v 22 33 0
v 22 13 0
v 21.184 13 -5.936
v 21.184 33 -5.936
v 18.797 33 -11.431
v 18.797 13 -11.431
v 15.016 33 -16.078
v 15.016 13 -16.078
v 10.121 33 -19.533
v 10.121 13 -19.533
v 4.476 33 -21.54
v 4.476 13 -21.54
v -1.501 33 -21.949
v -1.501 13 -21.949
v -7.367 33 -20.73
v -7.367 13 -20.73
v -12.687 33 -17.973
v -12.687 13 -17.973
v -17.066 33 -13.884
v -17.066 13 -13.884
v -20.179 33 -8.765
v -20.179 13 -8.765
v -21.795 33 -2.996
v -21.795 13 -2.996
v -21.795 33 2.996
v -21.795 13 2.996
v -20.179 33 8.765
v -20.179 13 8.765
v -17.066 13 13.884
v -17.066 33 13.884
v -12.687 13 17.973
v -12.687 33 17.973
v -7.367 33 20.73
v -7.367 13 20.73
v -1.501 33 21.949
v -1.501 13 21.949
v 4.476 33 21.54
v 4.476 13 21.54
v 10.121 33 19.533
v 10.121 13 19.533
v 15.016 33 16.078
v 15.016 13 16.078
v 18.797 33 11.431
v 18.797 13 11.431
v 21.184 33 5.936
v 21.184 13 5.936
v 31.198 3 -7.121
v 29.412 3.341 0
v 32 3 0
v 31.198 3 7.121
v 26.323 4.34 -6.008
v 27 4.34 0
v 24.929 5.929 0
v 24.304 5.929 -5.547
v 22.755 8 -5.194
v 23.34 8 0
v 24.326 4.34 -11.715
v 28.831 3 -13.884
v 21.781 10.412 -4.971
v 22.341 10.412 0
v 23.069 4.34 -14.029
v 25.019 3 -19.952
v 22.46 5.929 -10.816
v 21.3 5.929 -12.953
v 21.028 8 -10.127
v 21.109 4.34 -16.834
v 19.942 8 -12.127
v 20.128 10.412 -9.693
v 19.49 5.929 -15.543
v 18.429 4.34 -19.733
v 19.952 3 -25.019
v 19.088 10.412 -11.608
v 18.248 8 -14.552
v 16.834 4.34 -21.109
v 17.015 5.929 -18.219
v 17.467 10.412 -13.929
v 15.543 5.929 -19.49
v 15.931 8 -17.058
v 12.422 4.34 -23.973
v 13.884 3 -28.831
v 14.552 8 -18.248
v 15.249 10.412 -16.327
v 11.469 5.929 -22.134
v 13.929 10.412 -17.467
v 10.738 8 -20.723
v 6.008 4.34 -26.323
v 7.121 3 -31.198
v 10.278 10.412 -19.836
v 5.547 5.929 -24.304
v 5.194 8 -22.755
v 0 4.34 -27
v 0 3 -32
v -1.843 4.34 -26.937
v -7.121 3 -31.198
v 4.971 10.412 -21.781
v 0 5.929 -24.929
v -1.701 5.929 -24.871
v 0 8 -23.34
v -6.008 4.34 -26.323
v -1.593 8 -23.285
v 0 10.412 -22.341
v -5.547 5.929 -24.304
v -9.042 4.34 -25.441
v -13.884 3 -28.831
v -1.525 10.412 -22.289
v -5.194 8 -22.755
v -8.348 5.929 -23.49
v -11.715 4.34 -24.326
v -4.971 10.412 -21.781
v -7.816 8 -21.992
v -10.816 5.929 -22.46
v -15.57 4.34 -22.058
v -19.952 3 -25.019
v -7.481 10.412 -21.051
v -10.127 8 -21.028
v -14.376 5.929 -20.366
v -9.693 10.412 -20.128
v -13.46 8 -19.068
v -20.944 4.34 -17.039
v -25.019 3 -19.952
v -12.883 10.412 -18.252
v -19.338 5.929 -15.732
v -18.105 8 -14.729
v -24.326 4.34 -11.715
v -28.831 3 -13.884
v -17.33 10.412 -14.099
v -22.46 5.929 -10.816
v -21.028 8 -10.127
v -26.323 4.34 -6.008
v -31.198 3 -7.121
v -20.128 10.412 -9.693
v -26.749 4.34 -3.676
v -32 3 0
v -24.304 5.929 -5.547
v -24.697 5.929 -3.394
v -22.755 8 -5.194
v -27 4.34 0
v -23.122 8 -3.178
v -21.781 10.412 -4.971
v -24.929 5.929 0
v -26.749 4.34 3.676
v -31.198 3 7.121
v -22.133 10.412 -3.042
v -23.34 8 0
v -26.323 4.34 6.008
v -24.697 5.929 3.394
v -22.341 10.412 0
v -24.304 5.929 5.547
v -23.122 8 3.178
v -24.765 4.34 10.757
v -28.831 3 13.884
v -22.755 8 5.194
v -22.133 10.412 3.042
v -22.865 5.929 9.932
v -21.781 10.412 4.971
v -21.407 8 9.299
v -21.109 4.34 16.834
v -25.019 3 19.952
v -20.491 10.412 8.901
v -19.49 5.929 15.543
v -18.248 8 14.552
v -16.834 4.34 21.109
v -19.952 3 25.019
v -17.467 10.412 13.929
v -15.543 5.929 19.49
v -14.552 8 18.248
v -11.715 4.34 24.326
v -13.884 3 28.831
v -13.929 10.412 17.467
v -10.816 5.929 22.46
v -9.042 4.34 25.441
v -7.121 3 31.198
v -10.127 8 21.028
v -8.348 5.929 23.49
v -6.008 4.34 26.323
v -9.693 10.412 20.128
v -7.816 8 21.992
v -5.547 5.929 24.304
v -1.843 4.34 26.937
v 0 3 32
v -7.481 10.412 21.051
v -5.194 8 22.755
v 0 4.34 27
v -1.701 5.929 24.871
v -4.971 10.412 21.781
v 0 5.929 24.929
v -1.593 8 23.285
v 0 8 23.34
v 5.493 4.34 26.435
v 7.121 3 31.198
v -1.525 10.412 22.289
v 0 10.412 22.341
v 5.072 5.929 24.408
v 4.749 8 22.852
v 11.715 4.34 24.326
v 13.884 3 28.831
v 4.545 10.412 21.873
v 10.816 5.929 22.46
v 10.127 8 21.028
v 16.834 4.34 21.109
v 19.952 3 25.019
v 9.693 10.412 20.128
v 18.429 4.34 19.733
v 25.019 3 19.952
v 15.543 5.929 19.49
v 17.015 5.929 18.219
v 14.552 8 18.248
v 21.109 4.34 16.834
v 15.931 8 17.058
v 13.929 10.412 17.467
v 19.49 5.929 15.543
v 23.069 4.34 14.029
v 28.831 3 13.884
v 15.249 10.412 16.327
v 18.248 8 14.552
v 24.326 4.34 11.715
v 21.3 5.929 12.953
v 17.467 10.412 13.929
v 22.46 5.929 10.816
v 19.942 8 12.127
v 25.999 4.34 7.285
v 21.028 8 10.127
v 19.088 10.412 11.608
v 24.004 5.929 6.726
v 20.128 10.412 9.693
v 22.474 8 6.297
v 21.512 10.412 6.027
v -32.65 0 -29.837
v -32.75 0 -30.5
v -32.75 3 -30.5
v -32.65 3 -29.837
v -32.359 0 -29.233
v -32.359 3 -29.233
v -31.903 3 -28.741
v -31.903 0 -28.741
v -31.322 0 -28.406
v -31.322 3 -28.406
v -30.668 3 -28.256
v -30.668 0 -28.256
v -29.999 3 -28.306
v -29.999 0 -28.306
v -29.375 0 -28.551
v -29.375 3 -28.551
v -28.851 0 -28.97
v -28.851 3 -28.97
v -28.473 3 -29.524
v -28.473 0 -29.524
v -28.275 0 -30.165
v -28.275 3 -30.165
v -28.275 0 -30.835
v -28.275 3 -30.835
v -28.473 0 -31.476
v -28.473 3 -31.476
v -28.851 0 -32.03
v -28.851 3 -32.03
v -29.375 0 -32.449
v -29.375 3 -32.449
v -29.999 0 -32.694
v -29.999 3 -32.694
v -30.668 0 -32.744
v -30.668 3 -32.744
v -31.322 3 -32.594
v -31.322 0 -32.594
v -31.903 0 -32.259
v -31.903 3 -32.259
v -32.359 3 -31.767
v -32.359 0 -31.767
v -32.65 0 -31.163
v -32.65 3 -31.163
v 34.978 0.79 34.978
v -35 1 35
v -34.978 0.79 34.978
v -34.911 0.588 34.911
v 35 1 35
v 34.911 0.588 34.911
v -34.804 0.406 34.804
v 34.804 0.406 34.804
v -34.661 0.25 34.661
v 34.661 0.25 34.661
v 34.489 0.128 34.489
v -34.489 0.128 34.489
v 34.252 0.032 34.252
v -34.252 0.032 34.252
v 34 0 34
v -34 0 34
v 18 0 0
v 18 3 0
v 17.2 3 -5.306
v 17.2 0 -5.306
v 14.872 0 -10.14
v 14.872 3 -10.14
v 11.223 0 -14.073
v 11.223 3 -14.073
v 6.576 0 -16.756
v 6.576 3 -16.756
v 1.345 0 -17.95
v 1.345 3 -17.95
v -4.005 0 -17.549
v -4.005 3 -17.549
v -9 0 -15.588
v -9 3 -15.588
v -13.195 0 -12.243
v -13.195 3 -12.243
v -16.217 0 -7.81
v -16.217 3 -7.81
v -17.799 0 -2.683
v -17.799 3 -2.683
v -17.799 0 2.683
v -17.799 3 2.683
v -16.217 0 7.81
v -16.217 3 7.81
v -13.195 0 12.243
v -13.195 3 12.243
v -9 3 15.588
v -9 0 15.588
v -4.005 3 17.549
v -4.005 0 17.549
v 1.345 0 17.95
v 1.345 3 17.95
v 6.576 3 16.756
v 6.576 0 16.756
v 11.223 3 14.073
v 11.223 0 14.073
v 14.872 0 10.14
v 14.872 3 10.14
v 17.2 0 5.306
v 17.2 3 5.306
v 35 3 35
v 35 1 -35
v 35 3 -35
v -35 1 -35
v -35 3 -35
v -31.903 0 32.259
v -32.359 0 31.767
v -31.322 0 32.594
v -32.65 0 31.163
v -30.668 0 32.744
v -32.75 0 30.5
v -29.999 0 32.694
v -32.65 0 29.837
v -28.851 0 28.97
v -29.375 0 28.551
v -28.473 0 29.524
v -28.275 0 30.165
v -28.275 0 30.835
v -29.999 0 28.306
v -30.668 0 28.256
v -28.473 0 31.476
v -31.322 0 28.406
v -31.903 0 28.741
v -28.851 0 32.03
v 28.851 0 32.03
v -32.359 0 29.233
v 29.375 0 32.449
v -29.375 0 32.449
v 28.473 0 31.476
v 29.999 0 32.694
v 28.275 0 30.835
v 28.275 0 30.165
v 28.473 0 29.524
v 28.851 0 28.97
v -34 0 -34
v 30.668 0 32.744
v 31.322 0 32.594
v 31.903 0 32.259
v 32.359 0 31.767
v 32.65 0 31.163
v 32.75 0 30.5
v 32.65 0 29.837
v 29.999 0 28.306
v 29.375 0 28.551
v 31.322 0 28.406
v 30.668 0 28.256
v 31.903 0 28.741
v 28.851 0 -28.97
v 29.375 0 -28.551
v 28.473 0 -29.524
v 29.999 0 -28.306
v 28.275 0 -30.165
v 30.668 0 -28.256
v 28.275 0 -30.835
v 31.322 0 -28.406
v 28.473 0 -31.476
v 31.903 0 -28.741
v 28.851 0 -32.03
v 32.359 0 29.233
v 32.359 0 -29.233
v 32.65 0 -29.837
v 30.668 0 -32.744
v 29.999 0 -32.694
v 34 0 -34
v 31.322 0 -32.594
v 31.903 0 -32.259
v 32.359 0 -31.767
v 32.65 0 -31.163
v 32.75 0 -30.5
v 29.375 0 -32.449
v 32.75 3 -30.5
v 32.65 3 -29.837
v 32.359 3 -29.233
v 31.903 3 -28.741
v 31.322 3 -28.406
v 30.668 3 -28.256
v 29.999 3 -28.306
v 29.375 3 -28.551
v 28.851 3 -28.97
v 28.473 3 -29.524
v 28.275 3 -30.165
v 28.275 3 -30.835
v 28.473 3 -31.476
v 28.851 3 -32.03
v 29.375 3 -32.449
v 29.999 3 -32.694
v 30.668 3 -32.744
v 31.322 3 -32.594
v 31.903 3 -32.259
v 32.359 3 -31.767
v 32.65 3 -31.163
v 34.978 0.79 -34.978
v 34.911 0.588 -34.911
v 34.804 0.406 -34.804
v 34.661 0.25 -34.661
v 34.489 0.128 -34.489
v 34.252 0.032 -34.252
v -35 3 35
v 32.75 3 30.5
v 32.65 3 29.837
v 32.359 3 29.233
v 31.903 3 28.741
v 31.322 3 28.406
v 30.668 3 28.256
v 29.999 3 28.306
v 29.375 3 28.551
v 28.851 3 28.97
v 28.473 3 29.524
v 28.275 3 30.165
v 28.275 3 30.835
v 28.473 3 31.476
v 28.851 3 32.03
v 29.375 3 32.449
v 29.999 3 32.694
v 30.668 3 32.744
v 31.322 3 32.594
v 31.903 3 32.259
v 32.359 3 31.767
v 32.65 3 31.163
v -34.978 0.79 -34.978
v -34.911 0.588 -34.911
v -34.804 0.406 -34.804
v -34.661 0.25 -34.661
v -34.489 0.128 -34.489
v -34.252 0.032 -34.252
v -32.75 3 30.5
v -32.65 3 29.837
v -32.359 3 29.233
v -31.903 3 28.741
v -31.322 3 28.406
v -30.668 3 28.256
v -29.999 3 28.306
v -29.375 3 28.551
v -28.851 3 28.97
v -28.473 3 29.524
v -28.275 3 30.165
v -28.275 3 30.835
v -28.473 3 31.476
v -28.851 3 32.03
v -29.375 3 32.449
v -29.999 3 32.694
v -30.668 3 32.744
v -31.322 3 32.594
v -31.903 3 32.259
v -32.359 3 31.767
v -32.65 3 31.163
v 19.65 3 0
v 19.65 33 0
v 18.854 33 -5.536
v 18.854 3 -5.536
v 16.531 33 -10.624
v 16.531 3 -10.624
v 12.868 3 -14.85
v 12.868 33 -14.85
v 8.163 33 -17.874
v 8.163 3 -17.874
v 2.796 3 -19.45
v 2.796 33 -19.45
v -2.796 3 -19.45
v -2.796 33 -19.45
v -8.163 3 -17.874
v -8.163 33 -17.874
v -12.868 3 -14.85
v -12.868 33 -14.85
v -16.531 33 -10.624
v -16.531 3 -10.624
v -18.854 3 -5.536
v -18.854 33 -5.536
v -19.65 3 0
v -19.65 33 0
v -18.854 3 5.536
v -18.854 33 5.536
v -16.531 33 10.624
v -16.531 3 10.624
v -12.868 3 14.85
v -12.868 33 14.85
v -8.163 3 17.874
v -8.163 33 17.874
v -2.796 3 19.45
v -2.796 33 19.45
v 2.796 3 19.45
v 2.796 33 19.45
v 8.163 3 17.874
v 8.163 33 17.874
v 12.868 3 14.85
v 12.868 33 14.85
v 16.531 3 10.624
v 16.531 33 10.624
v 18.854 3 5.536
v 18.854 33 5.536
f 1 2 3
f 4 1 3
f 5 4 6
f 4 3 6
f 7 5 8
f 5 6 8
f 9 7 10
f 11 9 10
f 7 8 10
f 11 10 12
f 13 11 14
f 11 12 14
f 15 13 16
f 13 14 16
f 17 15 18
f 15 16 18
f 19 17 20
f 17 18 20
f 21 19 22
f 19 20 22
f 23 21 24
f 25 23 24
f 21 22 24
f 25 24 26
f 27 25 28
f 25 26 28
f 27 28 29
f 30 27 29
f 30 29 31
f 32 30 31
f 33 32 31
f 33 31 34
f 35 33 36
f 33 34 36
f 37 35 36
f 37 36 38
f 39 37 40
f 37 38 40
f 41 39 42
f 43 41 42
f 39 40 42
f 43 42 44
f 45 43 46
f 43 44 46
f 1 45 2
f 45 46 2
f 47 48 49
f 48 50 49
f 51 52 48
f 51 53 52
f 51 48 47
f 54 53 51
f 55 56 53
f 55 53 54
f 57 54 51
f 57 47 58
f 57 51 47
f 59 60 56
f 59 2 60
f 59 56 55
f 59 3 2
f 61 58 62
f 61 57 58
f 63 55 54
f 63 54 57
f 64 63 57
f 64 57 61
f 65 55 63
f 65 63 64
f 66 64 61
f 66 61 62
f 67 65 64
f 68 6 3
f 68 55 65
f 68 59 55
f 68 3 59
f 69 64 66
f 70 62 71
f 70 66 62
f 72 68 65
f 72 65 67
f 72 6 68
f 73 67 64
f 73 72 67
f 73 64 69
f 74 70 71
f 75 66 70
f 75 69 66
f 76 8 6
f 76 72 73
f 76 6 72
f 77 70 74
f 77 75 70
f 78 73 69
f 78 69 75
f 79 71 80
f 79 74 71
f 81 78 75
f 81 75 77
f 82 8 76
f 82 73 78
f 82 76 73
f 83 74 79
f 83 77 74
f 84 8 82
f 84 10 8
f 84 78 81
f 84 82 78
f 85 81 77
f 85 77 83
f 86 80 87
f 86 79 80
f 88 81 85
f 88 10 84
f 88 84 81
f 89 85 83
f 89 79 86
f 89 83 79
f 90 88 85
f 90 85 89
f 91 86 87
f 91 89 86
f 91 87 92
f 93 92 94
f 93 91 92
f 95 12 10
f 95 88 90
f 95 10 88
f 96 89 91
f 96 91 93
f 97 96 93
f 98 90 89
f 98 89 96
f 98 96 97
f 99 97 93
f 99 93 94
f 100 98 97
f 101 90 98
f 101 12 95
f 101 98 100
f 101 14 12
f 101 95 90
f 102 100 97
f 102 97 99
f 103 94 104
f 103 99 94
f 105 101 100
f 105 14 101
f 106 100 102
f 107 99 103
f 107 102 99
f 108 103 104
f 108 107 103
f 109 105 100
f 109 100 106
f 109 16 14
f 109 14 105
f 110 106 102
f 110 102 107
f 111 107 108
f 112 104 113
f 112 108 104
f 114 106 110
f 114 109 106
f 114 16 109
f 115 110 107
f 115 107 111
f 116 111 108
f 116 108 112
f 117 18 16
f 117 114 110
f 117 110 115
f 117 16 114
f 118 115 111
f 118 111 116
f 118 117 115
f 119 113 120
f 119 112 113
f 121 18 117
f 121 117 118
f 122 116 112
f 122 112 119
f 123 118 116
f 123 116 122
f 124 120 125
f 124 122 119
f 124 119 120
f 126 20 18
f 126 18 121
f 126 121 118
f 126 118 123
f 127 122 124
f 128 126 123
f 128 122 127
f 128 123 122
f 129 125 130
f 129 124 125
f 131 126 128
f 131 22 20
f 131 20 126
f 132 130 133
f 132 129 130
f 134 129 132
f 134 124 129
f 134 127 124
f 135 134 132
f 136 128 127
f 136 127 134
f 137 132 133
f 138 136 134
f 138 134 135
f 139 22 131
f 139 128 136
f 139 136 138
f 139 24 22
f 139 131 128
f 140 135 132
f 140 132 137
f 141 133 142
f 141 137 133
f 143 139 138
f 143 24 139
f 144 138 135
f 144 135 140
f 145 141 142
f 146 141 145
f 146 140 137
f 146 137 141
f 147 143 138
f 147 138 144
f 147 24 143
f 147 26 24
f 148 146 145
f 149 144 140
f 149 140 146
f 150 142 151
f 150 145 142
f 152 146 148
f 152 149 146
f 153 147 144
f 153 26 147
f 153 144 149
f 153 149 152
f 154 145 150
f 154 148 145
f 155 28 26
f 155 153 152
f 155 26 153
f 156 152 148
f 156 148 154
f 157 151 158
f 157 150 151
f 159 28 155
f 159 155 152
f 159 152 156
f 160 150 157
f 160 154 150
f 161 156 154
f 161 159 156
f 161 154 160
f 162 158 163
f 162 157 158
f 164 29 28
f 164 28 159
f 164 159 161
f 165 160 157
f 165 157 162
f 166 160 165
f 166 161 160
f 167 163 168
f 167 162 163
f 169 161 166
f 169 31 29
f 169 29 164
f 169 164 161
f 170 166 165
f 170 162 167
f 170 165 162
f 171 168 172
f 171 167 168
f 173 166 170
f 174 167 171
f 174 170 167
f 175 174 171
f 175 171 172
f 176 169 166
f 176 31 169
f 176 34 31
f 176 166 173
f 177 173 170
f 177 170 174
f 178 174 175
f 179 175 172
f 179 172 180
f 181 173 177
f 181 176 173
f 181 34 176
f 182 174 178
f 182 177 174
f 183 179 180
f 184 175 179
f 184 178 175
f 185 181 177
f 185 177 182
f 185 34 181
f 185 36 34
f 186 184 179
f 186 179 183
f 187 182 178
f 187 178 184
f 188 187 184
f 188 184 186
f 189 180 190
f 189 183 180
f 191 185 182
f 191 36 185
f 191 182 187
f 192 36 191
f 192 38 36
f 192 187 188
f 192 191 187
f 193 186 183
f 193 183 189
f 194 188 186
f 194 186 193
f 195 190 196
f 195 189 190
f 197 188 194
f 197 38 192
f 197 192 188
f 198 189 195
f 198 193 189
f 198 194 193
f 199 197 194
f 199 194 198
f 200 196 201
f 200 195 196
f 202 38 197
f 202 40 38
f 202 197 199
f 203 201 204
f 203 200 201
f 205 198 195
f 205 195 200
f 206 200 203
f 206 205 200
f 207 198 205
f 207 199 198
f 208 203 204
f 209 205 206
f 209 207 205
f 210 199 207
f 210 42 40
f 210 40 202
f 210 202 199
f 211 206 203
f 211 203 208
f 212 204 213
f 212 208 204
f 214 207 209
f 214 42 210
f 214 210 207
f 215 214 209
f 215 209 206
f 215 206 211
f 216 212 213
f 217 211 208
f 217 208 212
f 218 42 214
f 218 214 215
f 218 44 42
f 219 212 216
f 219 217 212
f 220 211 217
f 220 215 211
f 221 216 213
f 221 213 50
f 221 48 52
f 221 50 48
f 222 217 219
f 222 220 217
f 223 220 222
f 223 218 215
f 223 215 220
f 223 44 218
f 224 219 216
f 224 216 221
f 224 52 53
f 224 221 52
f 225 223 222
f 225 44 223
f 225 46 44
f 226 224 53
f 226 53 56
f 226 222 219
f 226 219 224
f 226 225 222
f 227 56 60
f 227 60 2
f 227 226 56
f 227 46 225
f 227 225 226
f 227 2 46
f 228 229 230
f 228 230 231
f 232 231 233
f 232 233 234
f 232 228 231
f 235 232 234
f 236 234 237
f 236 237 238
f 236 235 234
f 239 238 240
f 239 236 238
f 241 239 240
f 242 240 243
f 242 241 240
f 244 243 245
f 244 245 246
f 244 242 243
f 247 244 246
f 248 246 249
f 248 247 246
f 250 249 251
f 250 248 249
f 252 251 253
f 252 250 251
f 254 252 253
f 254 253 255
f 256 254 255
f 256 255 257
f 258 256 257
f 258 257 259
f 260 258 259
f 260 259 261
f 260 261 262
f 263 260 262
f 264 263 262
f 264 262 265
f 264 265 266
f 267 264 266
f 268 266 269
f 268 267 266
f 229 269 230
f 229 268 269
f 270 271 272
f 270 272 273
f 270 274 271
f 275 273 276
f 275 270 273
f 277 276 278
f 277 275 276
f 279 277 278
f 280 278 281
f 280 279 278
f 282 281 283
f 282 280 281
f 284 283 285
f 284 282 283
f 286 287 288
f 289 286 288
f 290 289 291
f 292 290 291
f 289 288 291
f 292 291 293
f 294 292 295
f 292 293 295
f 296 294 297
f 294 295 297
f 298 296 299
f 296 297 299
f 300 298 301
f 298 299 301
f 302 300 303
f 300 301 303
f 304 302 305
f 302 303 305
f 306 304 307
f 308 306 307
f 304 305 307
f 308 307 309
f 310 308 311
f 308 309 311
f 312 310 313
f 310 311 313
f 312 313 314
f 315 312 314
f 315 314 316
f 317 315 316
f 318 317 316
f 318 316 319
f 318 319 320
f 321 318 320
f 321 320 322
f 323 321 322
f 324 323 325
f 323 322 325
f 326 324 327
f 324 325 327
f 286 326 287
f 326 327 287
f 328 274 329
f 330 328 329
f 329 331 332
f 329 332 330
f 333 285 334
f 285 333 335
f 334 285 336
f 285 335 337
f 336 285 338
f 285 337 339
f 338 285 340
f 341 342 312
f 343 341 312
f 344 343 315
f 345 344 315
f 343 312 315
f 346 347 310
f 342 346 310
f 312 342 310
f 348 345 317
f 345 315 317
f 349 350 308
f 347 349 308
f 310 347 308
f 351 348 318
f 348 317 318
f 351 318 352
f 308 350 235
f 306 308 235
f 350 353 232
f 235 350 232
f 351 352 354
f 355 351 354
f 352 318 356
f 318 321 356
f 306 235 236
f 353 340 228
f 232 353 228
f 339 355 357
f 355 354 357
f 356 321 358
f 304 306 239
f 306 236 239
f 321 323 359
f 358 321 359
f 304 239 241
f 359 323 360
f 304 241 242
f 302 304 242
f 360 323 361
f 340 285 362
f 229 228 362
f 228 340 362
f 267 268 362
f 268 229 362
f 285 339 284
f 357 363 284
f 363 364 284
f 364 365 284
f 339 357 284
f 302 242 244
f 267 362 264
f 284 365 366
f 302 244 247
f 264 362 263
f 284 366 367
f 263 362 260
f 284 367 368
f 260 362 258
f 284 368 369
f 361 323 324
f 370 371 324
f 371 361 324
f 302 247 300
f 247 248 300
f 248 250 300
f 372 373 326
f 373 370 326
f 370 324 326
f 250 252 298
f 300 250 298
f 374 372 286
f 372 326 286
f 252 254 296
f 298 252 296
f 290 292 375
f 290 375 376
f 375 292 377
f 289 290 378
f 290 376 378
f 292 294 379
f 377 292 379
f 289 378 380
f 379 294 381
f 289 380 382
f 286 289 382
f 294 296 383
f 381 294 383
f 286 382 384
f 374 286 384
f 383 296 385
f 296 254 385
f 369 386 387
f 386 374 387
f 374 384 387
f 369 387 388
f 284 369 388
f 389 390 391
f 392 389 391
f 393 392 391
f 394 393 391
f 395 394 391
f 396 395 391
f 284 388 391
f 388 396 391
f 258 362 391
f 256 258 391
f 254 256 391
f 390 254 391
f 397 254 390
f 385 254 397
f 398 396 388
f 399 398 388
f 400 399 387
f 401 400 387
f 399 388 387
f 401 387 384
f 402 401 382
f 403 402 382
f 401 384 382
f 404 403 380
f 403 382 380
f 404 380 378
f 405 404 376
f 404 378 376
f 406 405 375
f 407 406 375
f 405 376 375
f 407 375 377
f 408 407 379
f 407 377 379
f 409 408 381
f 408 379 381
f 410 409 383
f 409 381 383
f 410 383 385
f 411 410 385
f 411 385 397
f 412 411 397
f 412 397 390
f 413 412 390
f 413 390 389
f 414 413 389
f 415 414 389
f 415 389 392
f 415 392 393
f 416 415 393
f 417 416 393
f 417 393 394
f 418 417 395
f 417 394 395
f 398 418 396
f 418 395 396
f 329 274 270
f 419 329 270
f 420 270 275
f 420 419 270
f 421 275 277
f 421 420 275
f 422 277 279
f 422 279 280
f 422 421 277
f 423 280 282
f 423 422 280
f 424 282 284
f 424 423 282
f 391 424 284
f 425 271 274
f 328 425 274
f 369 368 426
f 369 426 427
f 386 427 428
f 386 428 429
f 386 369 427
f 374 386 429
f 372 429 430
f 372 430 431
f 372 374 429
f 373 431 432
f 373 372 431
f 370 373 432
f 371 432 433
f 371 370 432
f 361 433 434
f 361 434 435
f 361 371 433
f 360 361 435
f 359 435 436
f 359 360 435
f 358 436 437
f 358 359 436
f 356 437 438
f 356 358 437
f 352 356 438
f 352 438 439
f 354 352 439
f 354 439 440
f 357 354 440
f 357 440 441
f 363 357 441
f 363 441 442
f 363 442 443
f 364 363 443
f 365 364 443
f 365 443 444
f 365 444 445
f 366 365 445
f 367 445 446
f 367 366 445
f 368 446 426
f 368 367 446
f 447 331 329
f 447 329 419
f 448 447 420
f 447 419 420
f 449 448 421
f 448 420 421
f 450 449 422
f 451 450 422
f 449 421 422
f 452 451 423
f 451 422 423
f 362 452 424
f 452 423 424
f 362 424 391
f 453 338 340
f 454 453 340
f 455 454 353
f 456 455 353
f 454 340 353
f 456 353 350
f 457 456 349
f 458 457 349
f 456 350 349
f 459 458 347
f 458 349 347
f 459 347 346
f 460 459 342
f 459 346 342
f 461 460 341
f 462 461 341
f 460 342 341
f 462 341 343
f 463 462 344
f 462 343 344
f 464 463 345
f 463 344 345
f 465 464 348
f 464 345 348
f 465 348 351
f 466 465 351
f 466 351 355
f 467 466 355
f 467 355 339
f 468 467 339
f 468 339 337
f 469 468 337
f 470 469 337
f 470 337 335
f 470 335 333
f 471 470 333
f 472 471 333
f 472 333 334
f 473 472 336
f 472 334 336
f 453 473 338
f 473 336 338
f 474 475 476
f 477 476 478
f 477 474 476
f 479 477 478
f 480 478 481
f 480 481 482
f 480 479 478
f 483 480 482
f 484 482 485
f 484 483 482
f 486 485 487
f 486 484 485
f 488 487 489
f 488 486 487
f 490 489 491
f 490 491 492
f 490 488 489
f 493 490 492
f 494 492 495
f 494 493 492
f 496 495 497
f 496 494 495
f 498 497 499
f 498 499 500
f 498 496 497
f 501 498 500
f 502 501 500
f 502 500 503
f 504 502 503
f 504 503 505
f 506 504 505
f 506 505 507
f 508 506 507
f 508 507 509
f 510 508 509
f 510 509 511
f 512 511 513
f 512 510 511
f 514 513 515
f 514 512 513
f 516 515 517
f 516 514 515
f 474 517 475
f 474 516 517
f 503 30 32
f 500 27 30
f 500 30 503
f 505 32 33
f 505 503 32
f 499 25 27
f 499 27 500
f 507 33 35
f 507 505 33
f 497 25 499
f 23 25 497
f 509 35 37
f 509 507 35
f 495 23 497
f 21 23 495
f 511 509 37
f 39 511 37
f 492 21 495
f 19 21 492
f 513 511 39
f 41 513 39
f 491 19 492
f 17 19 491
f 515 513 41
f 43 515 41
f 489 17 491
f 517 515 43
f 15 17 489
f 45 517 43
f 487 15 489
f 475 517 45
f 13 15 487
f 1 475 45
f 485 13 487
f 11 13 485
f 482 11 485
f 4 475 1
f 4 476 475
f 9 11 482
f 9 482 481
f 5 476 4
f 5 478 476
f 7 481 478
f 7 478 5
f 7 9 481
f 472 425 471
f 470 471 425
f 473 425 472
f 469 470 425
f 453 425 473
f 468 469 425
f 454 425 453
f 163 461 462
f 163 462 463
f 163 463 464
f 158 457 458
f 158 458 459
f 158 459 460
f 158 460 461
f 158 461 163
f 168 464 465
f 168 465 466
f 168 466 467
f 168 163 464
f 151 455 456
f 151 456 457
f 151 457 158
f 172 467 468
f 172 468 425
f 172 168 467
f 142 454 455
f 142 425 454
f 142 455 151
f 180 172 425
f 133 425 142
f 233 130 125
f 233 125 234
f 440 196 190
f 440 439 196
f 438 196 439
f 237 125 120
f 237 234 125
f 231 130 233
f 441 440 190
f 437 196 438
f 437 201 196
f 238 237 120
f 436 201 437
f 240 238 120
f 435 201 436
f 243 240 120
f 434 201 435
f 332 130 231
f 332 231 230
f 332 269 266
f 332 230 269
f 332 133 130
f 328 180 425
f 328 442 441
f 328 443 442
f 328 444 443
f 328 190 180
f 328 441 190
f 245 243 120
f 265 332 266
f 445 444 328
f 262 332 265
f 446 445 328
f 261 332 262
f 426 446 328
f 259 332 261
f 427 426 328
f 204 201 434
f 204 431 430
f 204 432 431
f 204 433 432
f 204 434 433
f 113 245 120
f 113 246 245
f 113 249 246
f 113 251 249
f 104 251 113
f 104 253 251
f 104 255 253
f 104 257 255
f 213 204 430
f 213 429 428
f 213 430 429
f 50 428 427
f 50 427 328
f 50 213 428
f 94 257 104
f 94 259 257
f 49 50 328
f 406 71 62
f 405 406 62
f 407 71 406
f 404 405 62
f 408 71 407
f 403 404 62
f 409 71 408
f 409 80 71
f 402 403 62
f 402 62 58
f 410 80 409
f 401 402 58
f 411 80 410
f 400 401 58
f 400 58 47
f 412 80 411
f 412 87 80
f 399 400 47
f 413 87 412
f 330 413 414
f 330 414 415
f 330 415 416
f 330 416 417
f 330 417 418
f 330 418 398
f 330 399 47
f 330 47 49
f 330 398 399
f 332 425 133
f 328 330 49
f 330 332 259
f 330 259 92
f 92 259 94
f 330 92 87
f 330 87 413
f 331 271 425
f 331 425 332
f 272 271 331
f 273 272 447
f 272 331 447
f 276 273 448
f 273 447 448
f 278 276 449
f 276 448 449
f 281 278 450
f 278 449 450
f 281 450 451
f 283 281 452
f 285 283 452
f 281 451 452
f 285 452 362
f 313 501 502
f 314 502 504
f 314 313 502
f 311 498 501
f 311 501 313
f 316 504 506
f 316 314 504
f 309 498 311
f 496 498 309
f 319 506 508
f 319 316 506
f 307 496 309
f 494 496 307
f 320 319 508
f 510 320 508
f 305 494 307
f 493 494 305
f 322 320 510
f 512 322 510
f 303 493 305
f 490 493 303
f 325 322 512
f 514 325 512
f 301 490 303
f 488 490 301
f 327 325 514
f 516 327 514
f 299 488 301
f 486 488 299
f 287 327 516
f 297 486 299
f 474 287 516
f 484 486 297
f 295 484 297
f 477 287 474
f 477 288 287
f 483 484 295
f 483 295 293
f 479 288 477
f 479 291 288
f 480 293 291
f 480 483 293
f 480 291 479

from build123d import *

# Parameters (mm, degrees)
SKETCH1_W                                  = 70
SKETCH1_H                                  = 70
BOSS_EXTRUDE1_DEPTH                        = 3
SKETCH2_R                                  = 18
CUT_EXTRUDE1_DEPTH                         = 3
SKETCH3_R                                  = 22
SKETCH3_R_2                                = 19.65
BOSS_EXTRUDE2_DEPTH                        = 30
FILLET1_R                                  = 10
SKETCH4_R                                  = 2.25
CUT_EXTRUDE2_DEPTH                         = 3
MIRROR1_AT_THE_SECOND_PLANE_COPY_1_SKETC_R = 2.25
MIRROR1_AT_THE_SECOND_PLANE_COPY_1_DEPTH   = 3
FILLET4_R                                  = 1


with BuildPart() as part:
    # Sketch1 → Boss-Extrude1 (new body)
    with BuildSketch(Plane(origin=(0, 0, 0), x_dir=(1, 0, 0), z_dir=(0, 1, 0))):
        Rectangle(SKETCH1_W, SKETCH1_H)
    extrude(amount=BOSS_EXTRUDE1_DEPTH)

    # Sketch2 → Cut-Extrude1 (cut)
    with BuildSketch(Plane(origin=(0, 3, 0), x_dir=(1, 0, 0), z_dir=(0, 1, 0))):
        Circle(SKETCH2_R)
    extrude(amount=-CUT_EXTRUDE1_DEPTH, mode=Mode.SUBTRACT)

    # Sketch3 → Boss-Extrude2 (add)
    with BuildSketch(Plane(origin=(0, 3, 0), x_dir=(1, 0, 0), z_dir=(0, 1, 0))):
        Circle(SKETCH3_R)
        Circle(SKETCH3_R_2, mode=Mode.SUBTRACT)
    extrude(amount=BOSS_EXTRUDE2_DEPTH)

    # Fillet1
    fillet1_edges = [part.edges().sort_by_distance(p)[0] for p in [
        (-22, 3, 0),
    ]]
    fillet(fillet1_edges, radius=FILLET1_R)

    # Sketch4 → Cut-Extrude2 (cut)
    with BuildSketch(Plane(origin=(0, 0, 0), x_dir=(-1, 0, 0), z_dir=(0, -1, 0))):
        with Locations((30.5, -30.5)):
            Circle(SKETCH4_R)
    cut_extrude2 = extrude(amount=-CUT_EXTRUDE2_DEPTH, mode=Mode.SUBTRACT)

    # Mirror1: Cut-Extrude2 across plane
    add(cut_extrude2.mirror(Plane(origin=(0, 0, 0), x_dir=(0, 0, 1), z_dir=(1, 0, 0))), mode=Mode.SUBTRACT)

    # Mirror1 at the second plane: Cut-Extrude2 across plane
    add(cut_extrude2.mirror(Plane.XY), mode=Mode.SUBTRACT)

    # Mirror1 at the second plane copy 1 sketc → Mirror1 at the second plane copy 1 (cut)
    with BuildSketch(Plane.XZ):
        with Locations((30.5, -30.5)):
            Circle(MIRROR1_AT_THE_SECOND_PLANE_COPY_1_SKETC_R)
    extrude(amount=-MIRROR1_AT_THE_SECOND_PLANE_COPY_1_DEPTH, mode=Mode.SUBTRACT)

    # Fillet4
    fillet4_edges = [part.edges().sort_by_distance(p)[0] for p in [
        (0, 0, 35),
        (-35, 0, 0),
        (0, 0, -35),
        (35, 0, 0),
    ]]
    fillet(fillet4_edges, radius=FILLET4_R)


solid = part.part
